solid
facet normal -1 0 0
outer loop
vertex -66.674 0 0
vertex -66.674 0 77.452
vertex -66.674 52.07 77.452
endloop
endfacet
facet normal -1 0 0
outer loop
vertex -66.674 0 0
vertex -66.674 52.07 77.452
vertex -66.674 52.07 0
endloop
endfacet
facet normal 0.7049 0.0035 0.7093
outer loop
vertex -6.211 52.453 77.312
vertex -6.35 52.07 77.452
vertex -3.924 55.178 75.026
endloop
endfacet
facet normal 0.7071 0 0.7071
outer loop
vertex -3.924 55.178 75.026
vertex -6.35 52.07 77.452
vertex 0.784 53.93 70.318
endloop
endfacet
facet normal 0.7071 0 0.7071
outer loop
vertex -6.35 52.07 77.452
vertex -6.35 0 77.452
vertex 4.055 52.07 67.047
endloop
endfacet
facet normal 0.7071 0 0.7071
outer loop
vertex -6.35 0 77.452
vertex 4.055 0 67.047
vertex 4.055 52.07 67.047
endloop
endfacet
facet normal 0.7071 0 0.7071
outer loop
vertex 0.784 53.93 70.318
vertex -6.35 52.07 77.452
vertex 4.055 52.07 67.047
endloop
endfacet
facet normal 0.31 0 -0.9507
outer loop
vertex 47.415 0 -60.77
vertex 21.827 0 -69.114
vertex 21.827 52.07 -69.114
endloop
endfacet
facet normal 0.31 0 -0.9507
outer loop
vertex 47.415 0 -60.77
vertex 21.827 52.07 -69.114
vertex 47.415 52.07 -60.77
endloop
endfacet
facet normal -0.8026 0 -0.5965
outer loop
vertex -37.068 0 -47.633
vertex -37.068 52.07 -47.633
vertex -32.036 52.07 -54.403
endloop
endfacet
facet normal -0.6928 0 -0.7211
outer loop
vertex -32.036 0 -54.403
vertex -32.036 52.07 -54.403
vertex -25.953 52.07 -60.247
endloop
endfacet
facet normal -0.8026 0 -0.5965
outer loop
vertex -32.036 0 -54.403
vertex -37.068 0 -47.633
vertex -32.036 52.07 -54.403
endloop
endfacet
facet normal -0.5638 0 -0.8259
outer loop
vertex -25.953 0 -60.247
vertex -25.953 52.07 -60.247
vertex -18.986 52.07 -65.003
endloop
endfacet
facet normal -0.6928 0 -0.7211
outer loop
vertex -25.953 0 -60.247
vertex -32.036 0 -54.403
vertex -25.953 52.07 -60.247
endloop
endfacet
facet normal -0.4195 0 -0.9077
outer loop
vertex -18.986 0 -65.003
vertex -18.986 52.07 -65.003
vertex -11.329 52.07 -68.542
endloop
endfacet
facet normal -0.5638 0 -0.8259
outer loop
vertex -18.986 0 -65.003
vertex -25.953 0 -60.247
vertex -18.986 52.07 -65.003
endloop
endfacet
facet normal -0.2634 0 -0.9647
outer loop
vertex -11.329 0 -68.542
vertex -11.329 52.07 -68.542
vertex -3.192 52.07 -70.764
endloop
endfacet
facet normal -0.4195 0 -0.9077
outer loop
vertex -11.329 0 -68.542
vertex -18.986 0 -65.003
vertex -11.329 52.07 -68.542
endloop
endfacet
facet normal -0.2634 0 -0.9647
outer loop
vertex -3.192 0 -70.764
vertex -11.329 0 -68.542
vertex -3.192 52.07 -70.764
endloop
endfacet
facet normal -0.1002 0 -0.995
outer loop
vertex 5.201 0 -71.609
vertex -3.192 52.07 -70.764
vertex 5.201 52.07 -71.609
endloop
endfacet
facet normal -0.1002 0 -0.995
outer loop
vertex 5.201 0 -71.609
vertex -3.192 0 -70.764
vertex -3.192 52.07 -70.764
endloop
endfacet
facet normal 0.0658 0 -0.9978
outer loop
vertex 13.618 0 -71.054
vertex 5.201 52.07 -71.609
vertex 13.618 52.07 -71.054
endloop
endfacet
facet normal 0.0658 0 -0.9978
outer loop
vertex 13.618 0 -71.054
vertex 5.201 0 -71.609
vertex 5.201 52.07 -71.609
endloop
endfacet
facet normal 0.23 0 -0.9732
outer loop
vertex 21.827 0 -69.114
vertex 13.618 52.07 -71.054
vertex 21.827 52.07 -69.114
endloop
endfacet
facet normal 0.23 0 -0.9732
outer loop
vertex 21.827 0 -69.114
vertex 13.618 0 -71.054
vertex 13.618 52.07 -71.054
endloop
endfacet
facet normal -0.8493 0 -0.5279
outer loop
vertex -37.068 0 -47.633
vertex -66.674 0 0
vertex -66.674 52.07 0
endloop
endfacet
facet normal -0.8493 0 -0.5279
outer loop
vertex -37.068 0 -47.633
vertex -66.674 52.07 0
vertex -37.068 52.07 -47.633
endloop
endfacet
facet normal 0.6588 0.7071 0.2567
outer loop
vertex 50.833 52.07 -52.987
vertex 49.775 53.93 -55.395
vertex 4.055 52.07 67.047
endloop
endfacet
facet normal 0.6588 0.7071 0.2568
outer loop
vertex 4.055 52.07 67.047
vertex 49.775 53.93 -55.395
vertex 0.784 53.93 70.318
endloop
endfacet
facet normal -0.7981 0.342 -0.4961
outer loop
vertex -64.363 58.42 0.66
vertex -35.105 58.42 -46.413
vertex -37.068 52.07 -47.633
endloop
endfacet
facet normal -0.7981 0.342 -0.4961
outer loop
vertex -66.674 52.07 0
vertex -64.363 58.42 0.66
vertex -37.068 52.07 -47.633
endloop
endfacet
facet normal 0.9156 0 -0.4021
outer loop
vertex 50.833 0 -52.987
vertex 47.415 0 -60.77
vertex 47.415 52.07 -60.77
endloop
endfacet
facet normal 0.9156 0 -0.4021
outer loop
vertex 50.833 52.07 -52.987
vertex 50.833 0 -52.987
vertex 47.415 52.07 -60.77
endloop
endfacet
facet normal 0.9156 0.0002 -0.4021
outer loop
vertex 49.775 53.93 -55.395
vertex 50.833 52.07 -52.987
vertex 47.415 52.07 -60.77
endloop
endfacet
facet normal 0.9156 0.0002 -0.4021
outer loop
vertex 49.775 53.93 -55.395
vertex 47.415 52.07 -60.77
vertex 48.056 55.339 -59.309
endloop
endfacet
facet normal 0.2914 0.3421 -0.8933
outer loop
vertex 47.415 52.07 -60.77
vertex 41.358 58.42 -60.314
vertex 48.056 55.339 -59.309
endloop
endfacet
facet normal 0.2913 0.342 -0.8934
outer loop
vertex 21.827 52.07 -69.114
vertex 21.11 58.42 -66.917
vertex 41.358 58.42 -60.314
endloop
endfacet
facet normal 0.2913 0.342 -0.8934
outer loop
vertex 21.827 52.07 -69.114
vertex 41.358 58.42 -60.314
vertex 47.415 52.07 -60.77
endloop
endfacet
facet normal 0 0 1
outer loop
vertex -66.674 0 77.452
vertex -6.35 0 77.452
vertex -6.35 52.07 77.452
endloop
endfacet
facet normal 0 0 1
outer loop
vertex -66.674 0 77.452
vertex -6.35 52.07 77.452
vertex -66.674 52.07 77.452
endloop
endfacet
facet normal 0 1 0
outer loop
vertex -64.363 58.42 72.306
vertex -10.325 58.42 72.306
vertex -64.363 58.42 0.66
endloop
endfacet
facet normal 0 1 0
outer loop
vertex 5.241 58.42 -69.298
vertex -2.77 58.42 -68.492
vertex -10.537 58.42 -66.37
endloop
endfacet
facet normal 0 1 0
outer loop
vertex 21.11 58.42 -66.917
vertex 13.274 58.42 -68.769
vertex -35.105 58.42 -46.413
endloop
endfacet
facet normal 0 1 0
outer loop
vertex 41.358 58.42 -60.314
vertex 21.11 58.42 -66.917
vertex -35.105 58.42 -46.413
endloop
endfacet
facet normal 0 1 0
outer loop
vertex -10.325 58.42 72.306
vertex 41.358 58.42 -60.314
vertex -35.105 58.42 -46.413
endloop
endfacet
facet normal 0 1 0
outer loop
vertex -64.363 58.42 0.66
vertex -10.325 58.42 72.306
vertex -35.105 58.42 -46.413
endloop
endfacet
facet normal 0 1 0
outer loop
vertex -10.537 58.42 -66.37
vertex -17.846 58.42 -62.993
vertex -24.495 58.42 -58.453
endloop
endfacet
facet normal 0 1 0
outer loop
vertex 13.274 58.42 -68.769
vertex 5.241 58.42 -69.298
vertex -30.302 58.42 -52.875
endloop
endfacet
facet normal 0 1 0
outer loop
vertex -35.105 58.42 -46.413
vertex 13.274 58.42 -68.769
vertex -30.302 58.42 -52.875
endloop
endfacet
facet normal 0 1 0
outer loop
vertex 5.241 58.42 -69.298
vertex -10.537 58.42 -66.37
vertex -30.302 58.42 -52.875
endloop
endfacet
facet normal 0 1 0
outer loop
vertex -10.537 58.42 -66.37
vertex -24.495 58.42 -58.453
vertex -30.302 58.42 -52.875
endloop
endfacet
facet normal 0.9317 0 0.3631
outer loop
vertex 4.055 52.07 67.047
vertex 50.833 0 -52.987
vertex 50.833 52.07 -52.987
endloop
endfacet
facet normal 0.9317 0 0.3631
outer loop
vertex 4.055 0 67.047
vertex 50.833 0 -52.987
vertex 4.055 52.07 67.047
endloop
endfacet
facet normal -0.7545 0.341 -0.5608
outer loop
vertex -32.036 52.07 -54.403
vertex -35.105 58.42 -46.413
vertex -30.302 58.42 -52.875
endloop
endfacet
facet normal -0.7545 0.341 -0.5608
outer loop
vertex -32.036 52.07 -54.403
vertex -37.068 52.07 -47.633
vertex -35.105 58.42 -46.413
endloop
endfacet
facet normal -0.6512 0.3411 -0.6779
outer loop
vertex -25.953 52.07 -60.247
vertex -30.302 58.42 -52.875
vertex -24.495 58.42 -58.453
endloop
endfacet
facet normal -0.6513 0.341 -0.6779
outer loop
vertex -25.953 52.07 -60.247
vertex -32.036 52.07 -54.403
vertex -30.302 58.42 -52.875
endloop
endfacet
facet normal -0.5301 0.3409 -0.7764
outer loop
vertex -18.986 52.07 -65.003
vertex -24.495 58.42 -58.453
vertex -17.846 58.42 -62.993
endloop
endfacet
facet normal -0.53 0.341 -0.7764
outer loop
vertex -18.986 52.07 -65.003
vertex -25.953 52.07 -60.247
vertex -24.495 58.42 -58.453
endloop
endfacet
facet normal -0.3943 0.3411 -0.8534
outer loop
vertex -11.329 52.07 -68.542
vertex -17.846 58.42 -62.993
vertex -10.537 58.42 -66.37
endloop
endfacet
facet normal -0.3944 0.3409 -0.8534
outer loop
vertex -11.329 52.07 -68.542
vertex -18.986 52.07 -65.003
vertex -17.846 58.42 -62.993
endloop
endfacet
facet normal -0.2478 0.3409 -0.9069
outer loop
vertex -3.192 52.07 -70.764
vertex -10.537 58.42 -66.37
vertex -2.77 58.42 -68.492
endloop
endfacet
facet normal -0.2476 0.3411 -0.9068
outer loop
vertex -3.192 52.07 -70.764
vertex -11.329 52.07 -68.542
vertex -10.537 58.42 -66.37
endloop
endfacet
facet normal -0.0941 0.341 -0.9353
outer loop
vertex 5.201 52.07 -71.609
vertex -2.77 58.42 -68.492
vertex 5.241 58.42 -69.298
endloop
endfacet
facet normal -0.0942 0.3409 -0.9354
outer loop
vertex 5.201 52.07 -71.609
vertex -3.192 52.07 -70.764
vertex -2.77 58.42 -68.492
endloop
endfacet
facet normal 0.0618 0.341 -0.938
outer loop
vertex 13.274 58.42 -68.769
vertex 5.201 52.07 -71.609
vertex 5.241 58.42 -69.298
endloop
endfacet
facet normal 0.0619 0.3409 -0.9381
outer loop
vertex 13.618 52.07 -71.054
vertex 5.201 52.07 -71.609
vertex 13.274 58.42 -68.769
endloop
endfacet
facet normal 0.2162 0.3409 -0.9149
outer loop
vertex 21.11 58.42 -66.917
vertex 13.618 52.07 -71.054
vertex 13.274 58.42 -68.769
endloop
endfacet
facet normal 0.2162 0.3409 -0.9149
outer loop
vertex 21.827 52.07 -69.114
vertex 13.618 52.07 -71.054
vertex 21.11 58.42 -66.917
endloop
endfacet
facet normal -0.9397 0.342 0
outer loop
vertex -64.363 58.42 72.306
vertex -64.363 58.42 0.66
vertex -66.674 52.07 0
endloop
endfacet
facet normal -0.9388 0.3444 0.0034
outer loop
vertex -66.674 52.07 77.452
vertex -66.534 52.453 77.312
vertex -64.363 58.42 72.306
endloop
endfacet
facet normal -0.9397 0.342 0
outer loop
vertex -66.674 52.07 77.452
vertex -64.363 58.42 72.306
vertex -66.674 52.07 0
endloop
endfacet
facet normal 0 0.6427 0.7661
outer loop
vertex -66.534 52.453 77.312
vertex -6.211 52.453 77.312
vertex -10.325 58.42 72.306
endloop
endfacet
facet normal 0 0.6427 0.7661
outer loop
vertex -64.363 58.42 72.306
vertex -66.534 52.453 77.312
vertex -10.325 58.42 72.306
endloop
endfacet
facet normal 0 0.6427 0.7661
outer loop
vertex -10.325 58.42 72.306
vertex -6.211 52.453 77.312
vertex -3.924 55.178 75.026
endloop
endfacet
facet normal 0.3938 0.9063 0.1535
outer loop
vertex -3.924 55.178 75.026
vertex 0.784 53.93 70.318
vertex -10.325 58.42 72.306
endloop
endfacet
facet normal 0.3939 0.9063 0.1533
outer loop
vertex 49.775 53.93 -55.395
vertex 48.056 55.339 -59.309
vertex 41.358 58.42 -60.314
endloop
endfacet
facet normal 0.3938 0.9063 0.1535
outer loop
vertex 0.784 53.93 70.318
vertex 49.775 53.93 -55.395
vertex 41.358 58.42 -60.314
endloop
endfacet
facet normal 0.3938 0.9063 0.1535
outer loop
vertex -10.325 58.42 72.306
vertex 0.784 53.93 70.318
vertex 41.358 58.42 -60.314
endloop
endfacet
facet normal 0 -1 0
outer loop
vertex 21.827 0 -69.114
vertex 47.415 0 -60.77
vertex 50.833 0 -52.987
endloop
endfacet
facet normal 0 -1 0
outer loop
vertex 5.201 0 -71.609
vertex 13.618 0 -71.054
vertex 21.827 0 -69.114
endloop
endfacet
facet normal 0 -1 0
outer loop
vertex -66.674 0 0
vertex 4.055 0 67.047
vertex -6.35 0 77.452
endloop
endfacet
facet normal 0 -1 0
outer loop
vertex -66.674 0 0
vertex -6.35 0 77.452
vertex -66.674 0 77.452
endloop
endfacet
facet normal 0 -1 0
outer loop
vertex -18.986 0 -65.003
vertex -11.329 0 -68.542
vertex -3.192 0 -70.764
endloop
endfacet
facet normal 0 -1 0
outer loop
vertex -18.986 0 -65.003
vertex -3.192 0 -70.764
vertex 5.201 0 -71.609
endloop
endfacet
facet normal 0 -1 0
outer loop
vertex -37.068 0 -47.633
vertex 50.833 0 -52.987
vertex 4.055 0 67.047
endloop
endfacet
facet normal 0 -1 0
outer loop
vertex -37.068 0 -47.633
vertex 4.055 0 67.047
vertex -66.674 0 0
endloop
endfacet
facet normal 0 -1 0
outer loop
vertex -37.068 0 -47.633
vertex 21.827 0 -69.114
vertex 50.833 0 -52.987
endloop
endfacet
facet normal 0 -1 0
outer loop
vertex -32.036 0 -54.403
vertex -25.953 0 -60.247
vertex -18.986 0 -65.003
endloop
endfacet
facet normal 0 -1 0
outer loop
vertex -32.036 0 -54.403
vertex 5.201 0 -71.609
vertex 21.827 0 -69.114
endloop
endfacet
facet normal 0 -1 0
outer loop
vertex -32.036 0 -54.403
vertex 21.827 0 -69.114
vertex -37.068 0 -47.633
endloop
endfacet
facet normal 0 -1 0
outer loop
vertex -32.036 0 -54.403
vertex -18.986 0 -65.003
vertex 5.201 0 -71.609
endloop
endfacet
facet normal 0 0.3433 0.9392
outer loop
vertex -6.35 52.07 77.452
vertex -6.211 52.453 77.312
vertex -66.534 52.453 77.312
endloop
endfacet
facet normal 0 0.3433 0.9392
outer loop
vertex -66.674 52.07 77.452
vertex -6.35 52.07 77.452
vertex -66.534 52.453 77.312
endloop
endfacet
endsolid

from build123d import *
from OCP.BRepFilletAPI import BRepFilletAPI_MakeChamfer

# Parameters (mm, degrees)
BOSS_EXTRUDE1_DEPTH = 58.42
CHAMFER1_SIZE       = 6.35
CHAMFER1_SIZE2      = 6.020287439
CHAMFER1_SIZE2_2    = 11.16699707
CHAMFER2_SIZE       = 6.35
CHAMFER2_SIZE2      = 2.311210988
CHAMFER3_SIZE       = 6.35
CHAMFER3_SIZE_2     = 5.138982639
CHAMFER3_SIZE_3     = 2.835119985
CHAMFER3_SIZE_4     = 2.311210988


with BuildPart() as part:
    # Sketch1 → Boss-Extrude1 (new body)
    with BuildSketch(Plane(origin=(0, 0, 0), x_dir=(1, 0, 0), z_dir=(0, 1, 0))):
        with BuildLine():
            Line((-66.673768512, 0), (-37.067821873, 47.633329988))
            ThreePointArc((-37.067821873, 47.633329988), (-11.329209284, 68.541566023), (21.82652777, 69.113940477))
            Line((21.82652777, 69.113940477), (53.138492197, 58.903517294))
            Line((53.138492197, 58.903517294), (0, -77.45185891))
            Line((0, -77.45185891), (-66.673768512, -77.45185891))
            Line((-66.673768512, -77.45185891), (-66.673768512, 0))
        make_face()
    extrude(amount=BOSS_EXTRUDE1_DEPTH)

    # Chamfer1: one chamfer whose edges measure the first distance from different faces: ONE call of the kernel's chamfer builder (chamfer() names one face for all edges)
    chamfer1_edges_1 = [part.edges().sort_by_distance(p)[0] for p in [
        (26.569246099, 58.42, 9.274170808),
    ]]
    chamfer1_edges_2 = [part.edges().sort_by_distance(p)[0] for p in [
        (53.138492197, 29.21, -58.903517294),
    ]]
    chamfer1_side_2 = [part.faces().sort_by_distance(p)[0] for p in [
        (26.569246099, 29.21, 9.274170808),
    ]]
    chamfer1_edges_3 = [part.edges().sort_by_distance(p)[0] for p in [
        (0, 29.21, 77.45185891),
    ]]
    chamfer1_side_3 = [part.faces().sort_by_distance(p)[0] for p in [
        (-33.336884256, 29.21, 77.45185891),
    ]]
    chamfer1 = BRepFilletAPI_MakeChamfer(part.part.solid().wrapped)
    for e in chamfer1_edges_1:
        chamfer1.Add(CHAMFER1_SIZE, e.wrapped)
    for e in chamfer1_edges_2:
        chamfer1.Add(CHAMFER1_SIZE, CHAMFER1_SIZE2, e.wrapped, chamfer1_side_2[0].wrapped)  # the first distance lies on this face
    for e in chamfer1_edges_3:
        chamfer1.Add(CHAMFER1_SIZE, CHAMFER1_SIZE2_2, e.wrapped, chamfer1_side_3[0].wrapped)  # the first distance lies on this face
    add(Compound.cast(chamfer1.Shape()), mode=Mode.REPLACE)

    # Chamfer2
    chamfer2_edges = [part.edges().sort_by_distance(p)[0] for p in [
        (-36.744460568, 58.42, 77.45185891),
    ]]
    chamfer2_side = [part.faces().sort_by_distance(p)[0] for p in [
        (-36.512742561, 29.20916862, 77.45185891),
    ]]
    chamfer(chamfer2_edges, length=CHAMFER2_SIZE, length2=CHAMFER2_SIZE2, reference=chamfer2_side[0])

    # Chamfer3
    # the kernel refuses this chamfer: 6.35, 5.138982639, 2.835119985, 2.311210988 mm, written as the material it takes off along each edge
    with BuildSketch(Plane(origin=(53.073265581, 58.42, -76.224082144), x_dir=(0.6674738144333207, -0.6977227871251095, 0.2601184718012205), z_dir=(-0.3631074004698769, 0, 0.9317472917717596))) as chamfer3_piece_1:
        Polygon((CHAMFER3_SIZE * 0.999913086528, -CHAMFER3_SIZE * 0.0131840581986), (-CHAMFER3_SIZE_2 * 0.716367861072, -CHAMFER3_SIZE_2 * 0.69772278716), (0, 0), align=None)
    extrude(amount=178.925693595, mode=Mode.SUBTRACT)
    with BuildSketch(Plane(origin=(10.558676445, 58.42, 75.140647923), x_dir=(0, -0.9351017353626564, 0.3543793793687052), z_dir=(-1, 0, 0))) as chamfer3_piece_2:
        Polygon((CHAMFER3_SIZE * 0.999913086528, -CHAMFER3_SIZE * 0.0131840581986), (-CHAMFER3_SIZE_3 * 0.354379379374, -CHAMFER3_SIZE_3 * 0.935101735377), (0, 0), align=None)
    extrude(amount=93.705581509, mode=Mode.SUBTRACT)
    with BuildSketch(Plane(origin=(21.82652777, 58.42, -69.113940477), x_dir=(-0.3084963411353717, 0.09904090225204967, 0.946055446148474), z_dir=(0.9507298394814789, 0, 0.3100205998309168))) as chamfer3_piece_3:
        Polygon((CHAMFER3_SIZE_4 * 0.995083363005, CHAMFER3_SIZE_4 * 0.0990409022345), (-CHAMFER3_SIZE * 0.099040902252, CHAMFER3_SIZE * 0.995083363182), (0, 0), align=None)
    extrude(amount=43.047689039, mode=Mode.SUBTRACT)
    with BuildSketch(Plane(origin=(6.077481299, 58.42, -20.816864631), x_dir=(-0.849316991574707, 0, -0.5278831763018113), z_dir=(-0.5278831763018113, 0, 0.849316991574707))) as chamfer3_piece_4:
        Polygon((50.8 - CHAMFER3_SIZE_4, 0), (50.8, CHAMFER3_SIZE), (50.8, 0), align=None)
    revolve(axis=Axis((6.077481299, 58.42, -20.816864631), (0, -1, 0)), revolution_arc=76.197931096, mode=Mode.SUBTRACT)
    with BuildSketch(Plane(origin=(-75.369660158, 58.42, 13.990914778), x_dir=(0.8451412083835613, 0.0990409022520497, 0.5252877664414751), z_dir=(0.5278831763018161, 0, -0.849316991574704))) as chamfer3_piece_5:
        Polygon((CHAMFER3_SIZE_4 * 0.995083363005, CHAMFER3_SIZE_4 * 0.0990409022345), (-CHAMFER3_SIZE * 0.0990409022521, CHAMFER3_SIZE * 0.995083363182), (0, 0), align=None)
    extrude(amount=72.557414224, mode=Mode.SUBTRACT)
    with BuildSketch(Plane(origin=(-66.673768512, 58.42, 91.613784474), x_dir=(0.9950833631817486, 0.09904090225205003, 0), z_dir=(0, 0, -1))) as chamfer3_piece_6:
        Polygon((CHAMFER3_SIZE_4 * 0.995083363005, CHAMFER3_SIZE_4 * 0.0990409022345), (-CHAMFER3_SIZE * 0.0990409022521, CHAMFER3_SIZE * 0.995083363182), (0, 0), align=None)
    extrude(amount=108.086921026, mode=Mode.SUBTRACT)


solid = part.part
